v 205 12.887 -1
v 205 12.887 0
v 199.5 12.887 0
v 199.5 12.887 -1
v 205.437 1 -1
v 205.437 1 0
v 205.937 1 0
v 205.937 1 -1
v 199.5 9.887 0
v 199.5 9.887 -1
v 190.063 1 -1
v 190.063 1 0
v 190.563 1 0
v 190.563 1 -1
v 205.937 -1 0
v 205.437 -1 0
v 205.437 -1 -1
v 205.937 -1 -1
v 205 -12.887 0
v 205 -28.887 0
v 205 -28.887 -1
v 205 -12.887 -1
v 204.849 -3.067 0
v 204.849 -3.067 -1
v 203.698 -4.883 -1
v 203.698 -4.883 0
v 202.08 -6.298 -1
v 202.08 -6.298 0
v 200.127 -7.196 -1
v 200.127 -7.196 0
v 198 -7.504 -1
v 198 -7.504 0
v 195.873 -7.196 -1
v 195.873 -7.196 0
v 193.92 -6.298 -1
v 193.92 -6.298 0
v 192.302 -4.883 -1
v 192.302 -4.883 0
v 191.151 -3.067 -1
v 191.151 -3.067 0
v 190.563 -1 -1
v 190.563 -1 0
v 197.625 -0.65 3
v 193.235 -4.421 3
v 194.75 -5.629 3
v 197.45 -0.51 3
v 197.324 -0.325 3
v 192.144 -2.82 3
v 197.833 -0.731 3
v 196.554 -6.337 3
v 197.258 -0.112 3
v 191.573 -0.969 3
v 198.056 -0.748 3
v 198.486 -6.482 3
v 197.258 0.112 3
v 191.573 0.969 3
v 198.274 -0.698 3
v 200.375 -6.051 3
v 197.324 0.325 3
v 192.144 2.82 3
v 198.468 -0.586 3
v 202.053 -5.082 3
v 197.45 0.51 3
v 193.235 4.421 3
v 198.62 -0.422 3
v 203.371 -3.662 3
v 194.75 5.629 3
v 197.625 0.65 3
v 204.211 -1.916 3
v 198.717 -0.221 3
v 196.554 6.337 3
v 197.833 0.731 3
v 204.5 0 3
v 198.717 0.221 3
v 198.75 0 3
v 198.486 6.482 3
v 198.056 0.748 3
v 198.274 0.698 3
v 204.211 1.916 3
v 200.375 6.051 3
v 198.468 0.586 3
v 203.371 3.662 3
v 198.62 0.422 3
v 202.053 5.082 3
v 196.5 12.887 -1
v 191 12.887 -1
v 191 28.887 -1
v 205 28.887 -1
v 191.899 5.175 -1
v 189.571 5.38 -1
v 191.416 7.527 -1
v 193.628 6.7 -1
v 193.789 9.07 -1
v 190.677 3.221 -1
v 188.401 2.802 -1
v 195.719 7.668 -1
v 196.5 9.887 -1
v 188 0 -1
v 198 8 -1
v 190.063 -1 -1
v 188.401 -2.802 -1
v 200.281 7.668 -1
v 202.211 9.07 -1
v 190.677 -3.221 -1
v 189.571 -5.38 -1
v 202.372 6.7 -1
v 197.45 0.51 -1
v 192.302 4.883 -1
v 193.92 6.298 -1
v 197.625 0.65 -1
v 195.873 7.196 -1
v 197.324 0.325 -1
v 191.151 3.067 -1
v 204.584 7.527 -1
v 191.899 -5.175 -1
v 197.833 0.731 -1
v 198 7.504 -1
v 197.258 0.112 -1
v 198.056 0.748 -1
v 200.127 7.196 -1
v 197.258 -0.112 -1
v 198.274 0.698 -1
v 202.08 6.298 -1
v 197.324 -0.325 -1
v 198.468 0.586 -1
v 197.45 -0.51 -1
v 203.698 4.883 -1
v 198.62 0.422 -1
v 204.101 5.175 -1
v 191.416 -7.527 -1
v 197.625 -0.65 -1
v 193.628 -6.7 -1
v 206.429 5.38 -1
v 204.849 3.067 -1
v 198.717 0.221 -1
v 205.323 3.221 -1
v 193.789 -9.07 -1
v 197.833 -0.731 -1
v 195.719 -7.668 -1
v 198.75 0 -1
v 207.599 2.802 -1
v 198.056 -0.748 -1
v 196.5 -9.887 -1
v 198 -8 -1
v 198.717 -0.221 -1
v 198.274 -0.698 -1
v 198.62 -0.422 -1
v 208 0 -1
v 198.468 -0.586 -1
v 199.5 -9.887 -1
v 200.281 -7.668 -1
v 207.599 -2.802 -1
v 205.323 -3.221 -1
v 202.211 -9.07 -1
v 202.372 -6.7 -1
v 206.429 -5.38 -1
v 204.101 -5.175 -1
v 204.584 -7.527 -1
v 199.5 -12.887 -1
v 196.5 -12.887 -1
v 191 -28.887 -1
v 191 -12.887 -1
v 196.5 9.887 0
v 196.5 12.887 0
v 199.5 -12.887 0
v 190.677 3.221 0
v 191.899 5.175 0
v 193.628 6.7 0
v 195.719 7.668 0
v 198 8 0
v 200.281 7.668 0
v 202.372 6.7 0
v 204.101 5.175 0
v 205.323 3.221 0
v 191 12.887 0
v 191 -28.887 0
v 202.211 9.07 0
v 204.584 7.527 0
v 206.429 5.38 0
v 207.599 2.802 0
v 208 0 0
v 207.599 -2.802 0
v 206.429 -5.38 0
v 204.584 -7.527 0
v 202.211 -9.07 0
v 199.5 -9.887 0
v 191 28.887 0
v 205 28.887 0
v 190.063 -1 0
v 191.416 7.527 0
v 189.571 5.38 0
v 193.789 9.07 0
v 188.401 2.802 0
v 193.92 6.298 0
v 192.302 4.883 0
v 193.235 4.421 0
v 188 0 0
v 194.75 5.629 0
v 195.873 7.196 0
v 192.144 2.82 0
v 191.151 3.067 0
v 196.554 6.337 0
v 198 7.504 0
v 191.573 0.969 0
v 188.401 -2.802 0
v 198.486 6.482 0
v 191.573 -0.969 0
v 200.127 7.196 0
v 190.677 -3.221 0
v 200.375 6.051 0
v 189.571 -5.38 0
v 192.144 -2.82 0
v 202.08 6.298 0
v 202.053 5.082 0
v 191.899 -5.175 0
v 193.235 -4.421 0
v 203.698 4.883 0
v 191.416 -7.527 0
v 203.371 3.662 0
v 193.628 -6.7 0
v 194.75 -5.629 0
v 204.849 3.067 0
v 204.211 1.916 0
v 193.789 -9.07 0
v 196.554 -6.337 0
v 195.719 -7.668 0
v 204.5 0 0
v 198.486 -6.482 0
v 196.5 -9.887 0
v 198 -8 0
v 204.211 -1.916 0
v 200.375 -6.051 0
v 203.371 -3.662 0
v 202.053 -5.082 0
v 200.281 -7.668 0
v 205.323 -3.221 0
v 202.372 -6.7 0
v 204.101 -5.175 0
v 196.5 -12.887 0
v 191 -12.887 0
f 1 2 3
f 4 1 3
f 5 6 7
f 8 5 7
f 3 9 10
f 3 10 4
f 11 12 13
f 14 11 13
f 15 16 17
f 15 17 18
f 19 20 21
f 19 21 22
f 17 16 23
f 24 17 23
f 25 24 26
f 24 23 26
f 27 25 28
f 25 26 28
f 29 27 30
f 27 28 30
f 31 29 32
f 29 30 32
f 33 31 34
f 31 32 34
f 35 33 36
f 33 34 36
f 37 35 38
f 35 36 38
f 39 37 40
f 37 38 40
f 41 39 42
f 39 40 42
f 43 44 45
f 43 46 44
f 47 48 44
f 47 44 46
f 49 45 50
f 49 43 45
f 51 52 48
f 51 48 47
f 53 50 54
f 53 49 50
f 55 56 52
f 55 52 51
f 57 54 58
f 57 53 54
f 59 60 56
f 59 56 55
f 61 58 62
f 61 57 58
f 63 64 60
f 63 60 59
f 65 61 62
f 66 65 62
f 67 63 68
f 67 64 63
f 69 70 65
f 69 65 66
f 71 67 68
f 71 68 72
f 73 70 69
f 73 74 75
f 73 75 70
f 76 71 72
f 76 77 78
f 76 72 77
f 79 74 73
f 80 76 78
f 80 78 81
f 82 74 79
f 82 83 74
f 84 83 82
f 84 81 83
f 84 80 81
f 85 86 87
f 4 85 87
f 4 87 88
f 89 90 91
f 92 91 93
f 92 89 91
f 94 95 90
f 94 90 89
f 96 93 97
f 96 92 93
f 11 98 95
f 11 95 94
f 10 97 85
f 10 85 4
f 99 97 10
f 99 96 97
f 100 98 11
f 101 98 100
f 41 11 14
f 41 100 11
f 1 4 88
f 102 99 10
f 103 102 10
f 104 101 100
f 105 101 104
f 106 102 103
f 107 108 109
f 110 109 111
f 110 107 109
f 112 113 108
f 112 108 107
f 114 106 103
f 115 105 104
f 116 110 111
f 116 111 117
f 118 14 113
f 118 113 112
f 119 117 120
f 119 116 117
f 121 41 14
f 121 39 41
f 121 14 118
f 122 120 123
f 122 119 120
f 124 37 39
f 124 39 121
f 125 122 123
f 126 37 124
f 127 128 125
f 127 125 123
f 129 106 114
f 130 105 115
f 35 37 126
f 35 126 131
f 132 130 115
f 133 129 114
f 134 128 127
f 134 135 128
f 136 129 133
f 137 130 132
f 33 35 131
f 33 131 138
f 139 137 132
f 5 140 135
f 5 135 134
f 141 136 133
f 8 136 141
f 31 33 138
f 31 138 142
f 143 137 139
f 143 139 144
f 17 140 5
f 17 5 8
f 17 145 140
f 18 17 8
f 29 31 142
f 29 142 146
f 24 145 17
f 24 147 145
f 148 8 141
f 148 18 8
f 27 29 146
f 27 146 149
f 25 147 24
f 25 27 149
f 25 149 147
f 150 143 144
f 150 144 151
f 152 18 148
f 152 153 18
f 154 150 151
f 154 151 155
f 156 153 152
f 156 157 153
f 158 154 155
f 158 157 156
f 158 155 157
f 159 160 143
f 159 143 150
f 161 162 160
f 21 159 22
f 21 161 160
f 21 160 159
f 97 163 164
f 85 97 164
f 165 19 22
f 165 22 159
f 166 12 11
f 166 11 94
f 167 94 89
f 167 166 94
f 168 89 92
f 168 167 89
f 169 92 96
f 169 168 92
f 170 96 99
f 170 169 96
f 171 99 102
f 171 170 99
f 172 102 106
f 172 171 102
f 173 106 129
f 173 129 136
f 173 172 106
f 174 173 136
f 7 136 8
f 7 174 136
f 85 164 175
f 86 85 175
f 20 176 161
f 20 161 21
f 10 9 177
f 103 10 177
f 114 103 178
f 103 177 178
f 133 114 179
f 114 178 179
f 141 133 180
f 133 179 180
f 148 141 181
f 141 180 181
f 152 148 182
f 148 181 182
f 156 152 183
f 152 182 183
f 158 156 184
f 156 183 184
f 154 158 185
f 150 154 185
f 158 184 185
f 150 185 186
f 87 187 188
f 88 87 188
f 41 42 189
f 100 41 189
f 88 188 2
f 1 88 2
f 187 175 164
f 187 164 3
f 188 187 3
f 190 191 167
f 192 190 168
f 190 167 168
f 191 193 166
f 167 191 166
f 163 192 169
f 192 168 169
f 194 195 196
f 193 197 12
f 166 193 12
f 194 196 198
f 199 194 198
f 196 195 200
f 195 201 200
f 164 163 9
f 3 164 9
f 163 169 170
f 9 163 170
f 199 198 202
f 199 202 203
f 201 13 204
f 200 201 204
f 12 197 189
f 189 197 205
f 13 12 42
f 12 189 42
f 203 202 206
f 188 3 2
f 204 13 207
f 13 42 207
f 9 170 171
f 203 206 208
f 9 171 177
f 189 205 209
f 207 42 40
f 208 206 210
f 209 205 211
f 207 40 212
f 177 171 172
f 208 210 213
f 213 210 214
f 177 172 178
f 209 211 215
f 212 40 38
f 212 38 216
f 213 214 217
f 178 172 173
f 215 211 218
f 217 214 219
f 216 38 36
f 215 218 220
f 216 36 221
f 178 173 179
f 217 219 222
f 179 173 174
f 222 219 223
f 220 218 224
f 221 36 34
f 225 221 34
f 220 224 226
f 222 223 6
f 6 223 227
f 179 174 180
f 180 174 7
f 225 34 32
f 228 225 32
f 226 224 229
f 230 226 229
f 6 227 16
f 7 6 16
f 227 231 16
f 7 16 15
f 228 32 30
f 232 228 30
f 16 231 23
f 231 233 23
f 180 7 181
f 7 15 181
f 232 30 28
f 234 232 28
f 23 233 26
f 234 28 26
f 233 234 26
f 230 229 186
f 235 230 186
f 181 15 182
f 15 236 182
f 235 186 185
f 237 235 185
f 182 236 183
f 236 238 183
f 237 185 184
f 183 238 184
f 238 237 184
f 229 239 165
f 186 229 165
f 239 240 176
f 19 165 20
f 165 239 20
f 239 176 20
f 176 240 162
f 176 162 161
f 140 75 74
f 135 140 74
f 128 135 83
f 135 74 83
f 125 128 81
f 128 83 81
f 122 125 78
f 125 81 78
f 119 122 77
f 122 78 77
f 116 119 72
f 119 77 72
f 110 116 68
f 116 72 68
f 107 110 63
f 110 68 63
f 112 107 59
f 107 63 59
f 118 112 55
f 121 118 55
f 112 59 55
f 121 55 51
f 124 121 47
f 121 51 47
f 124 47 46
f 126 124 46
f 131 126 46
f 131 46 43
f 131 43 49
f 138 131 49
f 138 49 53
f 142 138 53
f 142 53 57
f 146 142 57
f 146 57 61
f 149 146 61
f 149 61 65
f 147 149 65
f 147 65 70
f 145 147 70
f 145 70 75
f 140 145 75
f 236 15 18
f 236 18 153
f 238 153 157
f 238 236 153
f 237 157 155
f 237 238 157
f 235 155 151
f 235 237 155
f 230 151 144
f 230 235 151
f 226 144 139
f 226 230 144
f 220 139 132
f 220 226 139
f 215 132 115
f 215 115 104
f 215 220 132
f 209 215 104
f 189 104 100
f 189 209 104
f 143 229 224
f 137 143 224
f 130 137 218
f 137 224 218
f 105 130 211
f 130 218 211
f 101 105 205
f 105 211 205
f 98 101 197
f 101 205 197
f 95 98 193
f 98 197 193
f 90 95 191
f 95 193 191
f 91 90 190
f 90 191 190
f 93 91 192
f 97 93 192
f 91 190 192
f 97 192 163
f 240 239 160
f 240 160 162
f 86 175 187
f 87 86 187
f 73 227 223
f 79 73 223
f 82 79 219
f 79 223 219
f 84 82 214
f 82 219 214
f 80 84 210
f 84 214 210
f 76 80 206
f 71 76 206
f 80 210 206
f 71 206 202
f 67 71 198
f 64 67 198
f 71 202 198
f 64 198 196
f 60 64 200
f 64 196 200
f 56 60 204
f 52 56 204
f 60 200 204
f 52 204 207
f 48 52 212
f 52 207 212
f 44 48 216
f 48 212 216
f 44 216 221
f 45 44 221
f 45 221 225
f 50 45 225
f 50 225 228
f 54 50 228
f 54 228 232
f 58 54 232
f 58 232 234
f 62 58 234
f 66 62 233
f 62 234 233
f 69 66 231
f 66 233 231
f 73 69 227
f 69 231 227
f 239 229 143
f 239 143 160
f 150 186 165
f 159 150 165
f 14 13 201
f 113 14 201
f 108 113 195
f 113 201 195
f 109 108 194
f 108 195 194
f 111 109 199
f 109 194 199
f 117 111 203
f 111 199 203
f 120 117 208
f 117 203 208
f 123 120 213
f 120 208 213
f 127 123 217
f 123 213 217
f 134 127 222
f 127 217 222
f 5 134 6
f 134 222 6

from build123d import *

# Parameters (mm, degrees)
SKETCH043_R     = 6.5
PAD013_DEPTH    = 3
PAD014_DEPTH    = 1
SKETCH057_R     = 0.75
POCKET034_DEPTH = 5


with BuildPart() as part:
    # Sketch043 → Pad013 (new body)
    with BuildSketch(Plane.XY):
        Circle(SKETCH043_R)
    extrude(amount=PAD013_DEPTH)

    # Sketch044 (on Face2 of Pad013) → Pad014 (join)
    with BuildSketch(Plane(origin=(0, 0, 0), x_dir=(1, 0, 0), z_dir=(0, 0, -1))):
        with BuildLine():
            ThreePointArc((-1.5, 9.88686), (-10, 0), (-1.5, -9.88686))
            Line((-1.5, -9.88686), (-1.5, -12.88686))
            Line((-1.5, -12.88686), (-7, -12.88686))
            Line((-7, -12.88686), (-7, -28.88686))
            Line((-7, -28.88686), (7, -28.88686))
            Line((7, -28.88686), (7, -12.88686))
            Line((7, -12.88686), (1.5, -12.88686))
            Line((1.5, -9.88686), (1.5, -12.88686))
            ThreePointArc((1.5, -9.88686), (10, 0), (1.5, 9.88686))
            Line((1.5, 9.88686), (1.5, 12.88686))
            Line((7, 12.88686), (1.5, 12.88686))
            Line((7, 28.88686), (7, 12.88686))
            Line((-7, 28.88686), (7, 28.88686))
            Line((-7, 12.88686), (-7, 28.88686))
            Line((-1.5, 12.88686), (-7, 12.88686))
            Line((-1.5, 9.88686), (-1.5, 12.88686))
        make_face()
        with BuildLine():
            Line((-7.937254, -1), (-7.437254, -1))
            ThreePointArc((-7.437254, -1), (0, -7.504182), (7.437254, -1))
            Line((7.437254, -1), (7.937254, -1))
            ThreePointArc((-7.937254, -1), (0, -8), (7.937254, -1))
        make_face(mode=Mode.SUBTRACT)
        with BuildLine():
            Line((-7.437254, 1), (-7.937254, 1))
            ThreePointArc((7.937254, 1), (0, 8), (-7.937254, 1))
            Line((7.437254, 1), (7.937254, 1))
            ThreePointArc((7.437254, 1), (0, 7.504182), (-7.437254, 1))
        make_face(mode=Mode.SUBTRACT)
    extrude(amount=PAD014_DEPTH)

    # Sketch057 (on Face3 of Pad014) → Pocket034 (cut)
    with BuildSketch(Plane.XY.offset(3)):
        Circle(SKETCH057_R)
    extrude(amount=-POCKET034_DEPTH, mode=Mode.SUBTRACT)


with BuildPart() as part_1:
    # Body013 placement: moved
    add(part.part.moved(Location((198, 0, 0))))


solid = part_1.part
